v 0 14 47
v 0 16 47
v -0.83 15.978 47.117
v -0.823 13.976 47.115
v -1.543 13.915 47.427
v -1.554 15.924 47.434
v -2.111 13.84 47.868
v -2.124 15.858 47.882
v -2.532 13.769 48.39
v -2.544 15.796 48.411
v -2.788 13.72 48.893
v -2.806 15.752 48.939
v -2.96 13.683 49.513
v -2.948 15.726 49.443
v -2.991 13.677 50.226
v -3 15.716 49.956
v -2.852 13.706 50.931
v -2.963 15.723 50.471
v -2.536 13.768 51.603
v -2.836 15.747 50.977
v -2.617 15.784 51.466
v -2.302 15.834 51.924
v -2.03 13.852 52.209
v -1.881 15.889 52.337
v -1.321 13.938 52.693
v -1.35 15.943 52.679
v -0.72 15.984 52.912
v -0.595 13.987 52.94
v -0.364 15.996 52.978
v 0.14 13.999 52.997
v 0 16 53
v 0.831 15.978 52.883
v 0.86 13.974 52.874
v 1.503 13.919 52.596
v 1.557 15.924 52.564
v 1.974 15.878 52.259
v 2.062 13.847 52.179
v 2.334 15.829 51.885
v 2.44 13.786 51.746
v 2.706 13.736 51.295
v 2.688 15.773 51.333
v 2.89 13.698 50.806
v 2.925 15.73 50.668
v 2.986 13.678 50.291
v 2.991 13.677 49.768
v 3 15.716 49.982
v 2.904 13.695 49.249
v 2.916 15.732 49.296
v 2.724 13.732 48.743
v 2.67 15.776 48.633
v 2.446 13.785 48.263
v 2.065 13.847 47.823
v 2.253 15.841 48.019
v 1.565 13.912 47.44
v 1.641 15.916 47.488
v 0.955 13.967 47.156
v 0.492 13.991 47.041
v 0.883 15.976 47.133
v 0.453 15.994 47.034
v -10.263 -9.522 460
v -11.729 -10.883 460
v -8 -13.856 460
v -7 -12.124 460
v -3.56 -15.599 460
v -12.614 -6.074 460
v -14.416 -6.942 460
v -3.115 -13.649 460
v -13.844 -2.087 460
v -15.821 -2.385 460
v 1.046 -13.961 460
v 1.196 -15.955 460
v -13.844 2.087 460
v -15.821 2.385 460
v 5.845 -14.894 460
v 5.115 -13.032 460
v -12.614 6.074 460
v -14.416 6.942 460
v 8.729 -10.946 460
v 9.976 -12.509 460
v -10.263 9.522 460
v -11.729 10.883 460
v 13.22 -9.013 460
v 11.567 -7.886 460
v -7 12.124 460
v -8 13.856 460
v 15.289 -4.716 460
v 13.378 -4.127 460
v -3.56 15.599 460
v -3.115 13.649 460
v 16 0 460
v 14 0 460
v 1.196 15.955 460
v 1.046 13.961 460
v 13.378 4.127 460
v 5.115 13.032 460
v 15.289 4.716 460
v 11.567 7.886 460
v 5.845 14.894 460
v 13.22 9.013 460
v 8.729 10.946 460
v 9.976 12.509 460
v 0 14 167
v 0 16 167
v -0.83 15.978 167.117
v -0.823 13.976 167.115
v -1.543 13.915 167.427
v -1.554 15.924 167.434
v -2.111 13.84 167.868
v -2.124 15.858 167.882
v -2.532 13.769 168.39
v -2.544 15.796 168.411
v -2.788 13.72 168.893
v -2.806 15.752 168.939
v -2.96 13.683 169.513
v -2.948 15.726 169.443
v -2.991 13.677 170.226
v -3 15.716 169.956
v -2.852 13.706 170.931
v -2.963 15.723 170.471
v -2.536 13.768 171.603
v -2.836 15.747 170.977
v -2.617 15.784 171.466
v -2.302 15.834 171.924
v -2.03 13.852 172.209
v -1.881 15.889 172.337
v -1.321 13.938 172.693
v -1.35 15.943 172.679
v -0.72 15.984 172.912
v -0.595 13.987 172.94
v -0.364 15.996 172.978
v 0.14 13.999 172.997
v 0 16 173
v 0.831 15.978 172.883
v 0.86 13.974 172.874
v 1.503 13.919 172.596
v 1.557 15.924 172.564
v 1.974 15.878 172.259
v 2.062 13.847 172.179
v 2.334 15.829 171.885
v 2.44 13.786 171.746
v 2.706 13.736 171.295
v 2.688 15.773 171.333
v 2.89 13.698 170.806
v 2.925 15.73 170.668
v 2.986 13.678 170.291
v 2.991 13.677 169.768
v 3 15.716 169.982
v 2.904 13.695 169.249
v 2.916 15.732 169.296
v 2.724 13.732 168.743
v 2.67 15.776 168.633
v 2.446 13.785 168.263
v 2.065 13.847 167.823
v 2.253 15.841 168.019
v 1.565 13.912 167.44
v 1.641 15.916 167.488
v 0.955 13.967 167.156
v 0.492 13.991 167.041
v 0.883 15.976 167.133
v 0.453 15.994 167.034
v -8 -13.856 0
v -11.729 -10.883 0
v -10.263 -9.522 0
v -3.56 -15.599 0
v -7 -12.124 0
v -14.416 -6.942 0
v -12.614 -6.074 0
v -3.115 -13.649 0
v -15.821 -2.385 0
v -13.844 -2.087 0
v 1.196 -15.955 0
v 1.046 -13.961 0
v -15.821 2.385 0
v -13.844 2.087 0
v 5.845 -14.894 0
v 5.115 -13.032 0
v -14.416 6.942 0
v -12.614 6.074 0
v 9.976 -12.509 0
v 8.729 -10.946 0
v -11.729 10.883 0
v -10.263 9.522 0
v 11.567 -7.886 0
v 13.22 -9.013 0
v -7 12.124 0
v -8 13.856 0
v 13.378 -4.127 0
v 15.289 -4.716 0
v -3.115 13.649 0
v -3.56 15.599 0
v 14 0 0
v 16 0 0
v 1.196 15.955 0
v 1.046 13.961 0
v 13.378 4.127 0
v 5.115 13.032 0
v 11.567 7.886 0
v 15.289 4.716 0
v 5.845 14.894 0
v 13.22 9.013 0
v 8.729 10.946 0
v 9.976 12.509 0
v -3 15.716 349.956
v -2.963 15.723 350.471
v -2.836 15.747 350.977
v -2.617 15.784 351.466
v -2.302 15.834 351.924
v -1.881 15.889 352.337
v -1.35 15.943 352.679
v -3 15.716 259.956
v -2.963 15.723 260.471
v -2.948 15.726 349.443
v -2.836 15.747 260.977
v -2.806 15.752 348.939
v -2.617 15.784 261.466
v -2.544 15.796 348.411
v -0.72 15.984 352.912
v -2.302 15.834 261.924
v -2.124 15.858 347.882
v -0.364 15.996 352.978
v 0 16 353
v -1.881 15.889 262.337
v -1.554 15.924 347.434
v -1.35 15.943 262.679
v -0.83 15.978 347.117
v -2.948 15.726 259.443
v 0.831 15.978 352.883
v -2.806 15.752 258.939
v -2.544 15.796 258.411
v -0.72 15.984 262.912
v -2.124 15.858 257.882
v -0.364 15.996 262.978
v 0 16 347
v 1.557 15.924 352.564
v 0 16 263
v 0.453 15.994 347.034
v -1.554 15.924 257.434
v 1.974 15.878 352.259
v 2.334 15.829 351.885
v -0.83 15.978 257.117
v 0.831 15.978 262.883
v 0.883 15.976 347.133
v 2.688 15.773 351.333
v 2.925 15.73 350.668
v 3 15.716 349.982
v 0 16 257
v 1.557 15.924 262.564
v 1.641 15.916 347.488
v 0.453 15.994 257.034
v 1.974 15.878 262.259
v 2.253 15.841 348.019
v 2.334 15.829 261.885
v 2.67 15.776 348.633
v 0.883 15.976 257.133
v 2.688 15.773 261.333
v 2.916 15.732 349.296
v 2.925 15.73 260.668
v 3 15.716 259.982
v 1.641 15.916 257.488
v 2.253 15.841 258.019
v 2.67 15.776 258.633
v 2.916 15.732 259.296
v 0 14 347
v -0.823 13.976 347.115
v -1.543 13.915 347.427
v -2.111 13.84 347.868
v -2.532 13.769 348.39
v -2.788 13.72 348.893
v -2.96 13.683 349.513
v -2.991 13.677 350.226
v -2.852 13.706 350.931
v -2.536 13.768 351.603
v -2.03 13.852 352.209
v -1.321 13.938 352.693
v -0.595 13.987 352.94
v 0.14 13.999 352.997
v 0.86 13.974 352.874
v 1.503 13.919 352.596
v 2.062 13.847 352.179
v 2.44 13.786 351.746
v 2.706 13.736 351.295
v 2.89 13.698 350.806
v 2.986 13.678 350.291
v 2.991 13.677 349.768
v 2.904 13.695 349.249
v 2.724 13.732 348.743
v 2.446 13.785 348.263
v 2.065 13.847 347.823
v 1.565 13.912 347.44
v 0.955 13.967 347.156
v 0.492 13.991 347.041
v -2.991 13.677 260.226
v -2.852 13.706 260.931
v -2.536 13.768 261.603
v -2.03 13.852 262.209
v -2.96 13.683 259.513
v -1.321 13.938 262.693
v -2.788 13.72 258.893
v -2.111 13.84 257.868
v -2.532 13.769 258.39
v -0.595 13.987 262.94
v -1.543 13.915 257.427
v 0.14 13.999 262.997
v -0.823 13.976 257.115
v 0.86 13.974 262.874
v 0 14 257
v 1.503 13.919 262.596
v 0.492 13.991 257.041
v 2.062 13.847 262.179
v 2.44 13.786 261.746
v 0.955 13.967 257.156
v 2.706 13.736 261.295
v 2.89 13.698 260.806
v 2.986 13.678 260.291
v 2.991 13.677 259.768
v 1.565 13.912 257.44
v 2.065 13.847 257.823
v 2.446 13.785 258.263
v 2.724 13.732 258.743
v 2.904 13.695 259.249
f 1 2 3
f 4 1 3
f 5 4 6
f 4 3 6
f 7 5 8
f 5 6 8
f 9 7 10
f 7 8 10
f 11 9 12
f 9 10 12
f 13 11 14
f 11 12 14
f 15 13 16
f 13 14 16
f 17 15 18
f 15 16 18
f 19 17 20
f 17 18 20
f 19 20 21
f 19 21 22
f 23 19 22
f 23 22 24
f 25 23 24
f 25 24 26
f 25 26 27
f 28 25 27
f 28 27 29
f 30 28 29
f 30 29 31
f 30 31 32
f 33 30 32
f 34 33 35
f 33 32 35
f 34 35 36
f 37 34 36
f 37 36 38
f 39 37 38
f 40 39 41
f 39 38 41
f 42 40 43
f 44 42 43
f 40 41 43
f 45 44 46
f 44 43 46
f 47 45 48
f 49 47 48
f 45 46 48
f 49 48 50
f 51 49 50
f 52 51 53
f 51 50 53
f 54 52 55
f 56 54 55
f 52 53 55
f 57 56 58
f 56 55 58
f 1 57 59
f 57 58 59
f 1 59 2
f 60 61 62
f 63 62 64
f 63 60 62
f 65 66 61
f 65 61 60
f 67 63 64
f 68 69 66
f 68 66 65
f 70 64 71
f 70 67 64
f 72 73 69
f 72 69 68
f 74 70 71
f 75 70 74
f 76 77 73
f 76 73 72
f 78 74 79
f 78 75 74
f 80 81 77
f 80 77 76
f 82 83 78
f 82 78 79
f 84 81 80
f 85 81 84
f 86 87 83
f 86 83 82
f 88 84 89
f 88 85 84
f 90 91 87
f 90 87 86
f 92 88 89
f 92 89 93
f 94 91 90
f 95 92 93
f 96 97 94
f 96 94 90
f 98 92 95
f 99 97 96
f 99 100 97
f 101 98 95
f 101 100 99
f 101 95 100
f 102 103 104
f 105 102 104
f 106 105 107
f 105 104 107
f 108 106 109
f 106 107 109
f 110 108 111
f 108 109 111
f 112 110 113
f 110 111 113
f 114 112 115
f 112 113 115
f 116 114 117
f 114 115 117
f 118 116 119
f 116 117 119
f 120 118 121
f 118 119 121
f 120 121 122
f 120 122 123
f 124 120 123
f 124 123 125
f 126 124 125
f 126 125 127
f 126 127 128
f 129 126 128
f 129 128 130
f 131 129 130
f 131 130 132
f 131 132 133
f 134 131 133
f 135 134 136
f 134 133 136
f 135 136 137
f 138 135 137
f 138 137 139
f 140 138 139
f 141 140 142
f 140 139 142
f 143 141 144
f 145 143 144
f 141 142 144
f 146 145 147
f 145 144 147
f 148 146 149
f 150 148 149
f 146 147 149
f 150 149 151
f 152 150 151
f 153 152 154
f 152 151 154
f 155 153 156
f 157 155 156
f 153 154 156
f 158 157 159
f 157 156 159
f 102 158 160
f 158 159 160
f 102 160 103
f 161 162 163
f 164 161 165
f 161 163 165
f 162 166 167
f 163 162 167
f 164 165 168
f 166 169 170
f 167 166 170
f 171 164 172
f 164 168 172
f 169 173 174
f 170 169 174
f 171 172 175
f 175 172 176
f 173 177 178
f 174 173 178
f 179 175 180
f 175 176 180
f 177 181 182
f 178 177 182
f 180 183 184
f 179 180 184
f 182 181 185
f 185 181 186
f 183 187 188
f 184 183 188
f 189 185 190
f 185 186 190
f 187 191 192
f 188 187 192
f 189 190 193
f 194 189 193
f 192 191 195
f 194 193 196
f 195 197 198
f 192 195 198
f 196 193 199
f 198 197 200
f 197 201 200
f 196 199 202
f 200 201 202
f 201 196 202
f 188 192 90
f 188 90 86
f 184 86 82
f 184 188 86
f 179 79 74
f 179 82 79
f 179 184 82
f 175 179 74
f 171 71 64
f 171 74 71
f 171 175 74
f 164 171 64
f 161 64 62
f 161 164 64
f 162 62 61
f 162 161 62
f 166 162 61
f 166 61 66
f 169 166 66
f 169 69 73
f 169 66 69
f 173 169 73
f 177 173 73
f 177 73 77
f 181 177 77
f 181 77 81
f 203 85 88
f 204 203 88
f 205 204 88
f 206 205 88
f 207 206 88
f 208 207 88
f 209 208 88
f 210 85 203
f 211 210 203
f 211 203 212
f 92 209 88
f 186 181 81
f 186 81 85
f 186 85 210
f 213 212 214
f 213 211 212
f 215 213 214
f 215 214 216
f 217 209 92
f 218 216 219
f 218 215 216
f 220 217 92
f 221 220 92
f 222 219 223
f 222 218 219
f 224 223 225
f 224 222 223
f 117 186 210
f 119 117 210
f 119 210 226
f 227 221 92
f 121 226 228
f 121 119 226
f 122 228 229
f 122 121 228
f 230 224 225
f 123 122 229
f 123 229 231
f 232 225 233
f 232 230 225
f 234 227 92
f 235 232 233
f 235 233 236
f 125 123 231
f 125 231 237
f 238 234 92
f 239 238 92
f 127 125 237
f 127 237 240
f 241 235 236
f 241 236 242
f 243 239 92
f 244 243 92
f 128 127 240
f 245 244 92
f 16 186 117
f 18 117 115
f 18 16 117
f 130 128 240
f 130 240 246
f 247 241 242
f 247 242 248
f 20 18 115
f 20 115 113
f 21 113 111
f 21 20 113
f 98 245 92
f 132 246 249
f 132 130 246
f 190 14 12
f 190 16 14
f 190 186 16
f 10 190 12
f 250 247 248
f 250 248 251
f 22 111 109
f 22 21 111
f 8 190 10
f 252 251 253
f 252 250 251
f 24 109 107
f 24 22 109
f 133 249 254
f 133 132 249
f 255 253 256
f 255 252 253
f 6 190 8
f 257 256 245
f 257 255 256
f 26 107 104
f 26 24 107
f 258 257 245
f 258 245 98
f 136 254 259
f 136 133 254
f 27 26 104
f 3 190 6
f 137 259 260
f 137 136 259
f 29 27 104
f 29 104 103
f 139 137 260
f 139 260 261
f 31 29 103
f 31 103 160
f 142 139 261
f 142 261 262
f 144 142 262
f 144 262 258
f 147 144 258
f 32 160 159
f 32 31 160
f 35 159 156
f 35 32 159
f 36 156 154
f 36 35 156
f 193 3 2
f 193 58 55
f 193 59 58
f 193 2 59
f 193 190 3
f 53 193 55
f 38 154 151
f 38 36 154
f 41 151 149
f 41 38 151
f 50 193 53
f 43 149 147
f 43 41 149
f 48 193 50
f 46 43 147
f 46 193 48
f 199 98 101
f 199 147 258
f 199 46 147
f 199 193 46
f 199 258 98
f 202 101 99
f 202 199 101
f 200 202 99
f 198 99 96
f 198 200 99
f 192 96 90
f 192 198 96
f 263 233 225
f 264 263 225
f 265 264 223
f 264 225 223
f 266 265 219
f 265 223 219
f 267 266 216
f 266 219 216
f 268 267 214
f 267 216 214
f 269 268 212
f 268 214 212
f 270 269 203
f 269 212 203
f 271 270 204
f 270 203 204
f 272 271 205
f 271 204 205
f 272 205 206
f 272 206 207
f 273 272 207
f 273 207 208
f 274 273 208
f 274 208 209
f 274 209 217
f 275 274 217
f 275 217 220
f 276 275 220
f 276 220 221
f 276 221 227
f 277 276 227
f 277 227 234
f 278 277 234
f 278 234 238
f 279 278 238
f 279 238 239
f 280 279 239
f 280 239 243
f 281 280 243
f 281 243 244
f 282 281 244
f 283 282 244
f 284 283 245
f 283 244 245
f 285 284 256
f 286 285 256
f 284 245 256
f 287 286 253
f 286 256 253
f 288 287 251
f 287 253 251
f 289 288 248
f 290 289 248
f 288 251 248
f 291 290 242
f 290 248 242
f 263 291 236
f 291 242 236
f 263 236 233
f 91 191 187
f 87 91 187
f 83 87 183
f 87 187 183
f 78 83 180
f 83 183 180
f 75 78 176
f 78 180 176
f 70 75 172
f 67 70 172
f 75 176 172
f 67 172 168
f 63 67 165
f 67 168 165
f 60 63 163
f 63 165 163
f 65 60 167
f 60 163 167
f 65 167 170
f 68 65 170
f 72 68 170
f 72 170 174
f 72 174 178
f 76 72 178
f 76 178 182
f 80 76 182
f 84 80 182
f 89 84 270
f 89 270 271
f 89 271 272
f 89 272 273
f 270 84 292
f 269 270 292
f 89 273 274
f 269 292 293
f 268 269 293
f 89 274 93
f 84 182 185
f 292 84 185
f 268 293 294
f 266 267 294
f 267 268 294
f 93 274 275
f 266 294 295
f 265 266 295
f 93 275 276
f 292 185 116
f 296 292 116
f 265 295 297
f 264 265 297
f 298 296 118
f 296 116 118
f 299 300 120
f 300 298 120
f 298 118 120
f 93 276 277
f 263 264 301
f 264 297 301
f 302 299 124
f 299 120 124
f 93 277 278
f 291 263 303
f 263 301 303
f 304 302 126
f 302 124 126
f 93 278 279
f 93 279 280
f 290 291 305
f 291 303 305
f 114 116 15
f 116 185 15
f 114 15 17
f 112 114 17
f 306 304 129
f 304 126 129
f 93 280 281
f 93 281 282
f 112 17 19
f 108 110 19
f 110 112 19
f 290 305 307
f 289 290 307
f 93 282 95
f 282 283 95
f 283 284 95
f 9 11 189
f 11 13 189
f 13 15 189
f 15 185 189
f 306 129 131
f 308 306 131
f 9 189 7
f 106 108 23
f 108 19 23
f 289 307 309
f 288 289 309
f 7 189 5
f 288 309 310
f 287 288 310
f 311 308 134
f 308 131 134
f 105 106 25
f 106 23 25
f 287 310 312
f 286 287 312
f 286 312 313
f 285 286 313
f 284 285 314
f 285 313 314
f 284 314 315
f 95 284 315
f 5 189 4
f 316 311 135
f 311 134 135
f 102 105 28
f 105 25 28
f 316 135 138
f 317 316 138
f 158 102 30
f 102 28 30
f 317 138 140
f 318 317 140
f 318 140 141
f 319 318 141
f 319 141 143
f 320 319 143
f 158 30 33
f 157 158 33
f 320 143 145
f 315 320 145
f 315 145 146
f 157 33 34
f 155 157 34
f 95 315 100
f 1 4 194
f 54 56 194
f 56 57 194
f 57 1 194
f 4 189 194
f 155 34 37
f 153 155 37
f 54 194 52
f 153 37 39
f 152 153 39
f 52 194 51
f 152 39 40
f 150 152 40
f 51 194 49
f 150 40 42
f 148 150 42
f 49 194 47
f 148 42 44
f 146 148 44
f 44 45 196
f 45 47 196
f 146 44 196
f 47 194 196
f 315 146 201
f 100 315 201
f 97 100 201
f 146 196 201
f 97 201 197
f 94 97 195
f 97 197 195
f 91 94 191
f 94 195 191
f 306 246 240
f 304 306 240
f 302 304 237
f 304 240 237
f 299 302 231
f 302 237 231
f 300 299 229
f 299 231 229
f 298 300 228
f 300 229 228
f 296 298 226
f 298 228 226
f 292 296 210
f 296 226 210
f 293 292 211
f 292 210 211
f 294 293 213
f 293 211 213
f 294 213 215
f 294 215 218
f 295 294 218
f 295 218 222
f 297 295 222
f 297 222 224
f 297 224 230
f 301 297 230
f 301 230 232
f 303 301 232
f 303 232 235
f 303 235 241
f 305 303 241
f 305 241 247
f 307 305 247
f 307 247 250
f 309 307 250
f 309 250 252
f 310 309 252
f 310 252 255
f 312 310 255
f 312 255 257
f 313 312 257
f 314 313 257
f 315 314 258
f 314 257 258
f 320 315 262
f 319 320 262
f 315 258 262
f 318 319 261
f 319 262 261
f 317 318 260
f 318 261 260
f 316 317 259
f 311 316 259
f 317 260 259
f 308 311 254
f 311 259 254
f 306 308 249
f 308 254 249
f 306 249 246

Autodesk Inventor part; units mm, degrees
ref_plane "YZ Plane" through (0, 0, 0) normal (1, 0, 0) x (0, 1, 0)
ref_plane "XZ Plane" through (0, 0, 0) normal (0, 1, 0) x (-1, 0, 0)
ref_plane "XY Plane" through (0, 0, 0) normal (0, 0, 1) x (1, 0, 0)
sketch "Szkic2" plane through (0, 0, 0) normal (0, 0, 1) x (1, 0, 0)
  circle A0 centre (0, 0) radius 16
  dimension "d4" = 32
extrude "Wyciągnięcie proste2" add sketch "Szkic2" along normal blind 460
shell "Skorupa2" thickness 2 removed faces 2 at (4.7224, 2.4785, 0) at (4.7224, 2.4785, 460)
sketch "Szkic3" plane through (0, 0, 0) normal (0, 1, 0) x (-1, 0, 0)
  line L0 (-16, 0) -> (16, 0) construction
  line L1 (0, 0) -> (0, 395.7207) construction
  point P0 (0, 50)
  point P1 (0, 170)
  point P2 (0, 260)
  point P3 (0, 350)
  dimension "d8" = 90
  dimension "d9" = 90
  dimension "d10" = 120
  dimension "d11" = 50
hole "Otwór1" at (0, 0, 50) at (0, 0, 170) at (0, 0, 260) at (0, 0, 350) direction (0, 1, 0) diameter 6 depth 16 tip angle 118
equation "\"PromieńGięcia\" = Grubość"
equation "\"SzerokośćGięciaPodcięcia\" = Grubość"
equation "\"GłębokośćGięciaPodcięcia\" = 0.5 * Grubość"
equation "\"RozmiarPodcięciaNarożnika\" = 4 * Grubość"
equation "\"MinimalnaPozostałość\" = 2 * Grubość"
equation "\"PromieńPrzejścia\" = PromieńGięcia"
equation "\"Rozmiar_promienia_Jacobiego\" = PromieńGięcia"
equation "\"Wielk_odstępu\" = Grubość"
equation "\"Grubość\" = 0.5"
properties part number "Rura_oparcia" material "Aluminium AW-7020"
